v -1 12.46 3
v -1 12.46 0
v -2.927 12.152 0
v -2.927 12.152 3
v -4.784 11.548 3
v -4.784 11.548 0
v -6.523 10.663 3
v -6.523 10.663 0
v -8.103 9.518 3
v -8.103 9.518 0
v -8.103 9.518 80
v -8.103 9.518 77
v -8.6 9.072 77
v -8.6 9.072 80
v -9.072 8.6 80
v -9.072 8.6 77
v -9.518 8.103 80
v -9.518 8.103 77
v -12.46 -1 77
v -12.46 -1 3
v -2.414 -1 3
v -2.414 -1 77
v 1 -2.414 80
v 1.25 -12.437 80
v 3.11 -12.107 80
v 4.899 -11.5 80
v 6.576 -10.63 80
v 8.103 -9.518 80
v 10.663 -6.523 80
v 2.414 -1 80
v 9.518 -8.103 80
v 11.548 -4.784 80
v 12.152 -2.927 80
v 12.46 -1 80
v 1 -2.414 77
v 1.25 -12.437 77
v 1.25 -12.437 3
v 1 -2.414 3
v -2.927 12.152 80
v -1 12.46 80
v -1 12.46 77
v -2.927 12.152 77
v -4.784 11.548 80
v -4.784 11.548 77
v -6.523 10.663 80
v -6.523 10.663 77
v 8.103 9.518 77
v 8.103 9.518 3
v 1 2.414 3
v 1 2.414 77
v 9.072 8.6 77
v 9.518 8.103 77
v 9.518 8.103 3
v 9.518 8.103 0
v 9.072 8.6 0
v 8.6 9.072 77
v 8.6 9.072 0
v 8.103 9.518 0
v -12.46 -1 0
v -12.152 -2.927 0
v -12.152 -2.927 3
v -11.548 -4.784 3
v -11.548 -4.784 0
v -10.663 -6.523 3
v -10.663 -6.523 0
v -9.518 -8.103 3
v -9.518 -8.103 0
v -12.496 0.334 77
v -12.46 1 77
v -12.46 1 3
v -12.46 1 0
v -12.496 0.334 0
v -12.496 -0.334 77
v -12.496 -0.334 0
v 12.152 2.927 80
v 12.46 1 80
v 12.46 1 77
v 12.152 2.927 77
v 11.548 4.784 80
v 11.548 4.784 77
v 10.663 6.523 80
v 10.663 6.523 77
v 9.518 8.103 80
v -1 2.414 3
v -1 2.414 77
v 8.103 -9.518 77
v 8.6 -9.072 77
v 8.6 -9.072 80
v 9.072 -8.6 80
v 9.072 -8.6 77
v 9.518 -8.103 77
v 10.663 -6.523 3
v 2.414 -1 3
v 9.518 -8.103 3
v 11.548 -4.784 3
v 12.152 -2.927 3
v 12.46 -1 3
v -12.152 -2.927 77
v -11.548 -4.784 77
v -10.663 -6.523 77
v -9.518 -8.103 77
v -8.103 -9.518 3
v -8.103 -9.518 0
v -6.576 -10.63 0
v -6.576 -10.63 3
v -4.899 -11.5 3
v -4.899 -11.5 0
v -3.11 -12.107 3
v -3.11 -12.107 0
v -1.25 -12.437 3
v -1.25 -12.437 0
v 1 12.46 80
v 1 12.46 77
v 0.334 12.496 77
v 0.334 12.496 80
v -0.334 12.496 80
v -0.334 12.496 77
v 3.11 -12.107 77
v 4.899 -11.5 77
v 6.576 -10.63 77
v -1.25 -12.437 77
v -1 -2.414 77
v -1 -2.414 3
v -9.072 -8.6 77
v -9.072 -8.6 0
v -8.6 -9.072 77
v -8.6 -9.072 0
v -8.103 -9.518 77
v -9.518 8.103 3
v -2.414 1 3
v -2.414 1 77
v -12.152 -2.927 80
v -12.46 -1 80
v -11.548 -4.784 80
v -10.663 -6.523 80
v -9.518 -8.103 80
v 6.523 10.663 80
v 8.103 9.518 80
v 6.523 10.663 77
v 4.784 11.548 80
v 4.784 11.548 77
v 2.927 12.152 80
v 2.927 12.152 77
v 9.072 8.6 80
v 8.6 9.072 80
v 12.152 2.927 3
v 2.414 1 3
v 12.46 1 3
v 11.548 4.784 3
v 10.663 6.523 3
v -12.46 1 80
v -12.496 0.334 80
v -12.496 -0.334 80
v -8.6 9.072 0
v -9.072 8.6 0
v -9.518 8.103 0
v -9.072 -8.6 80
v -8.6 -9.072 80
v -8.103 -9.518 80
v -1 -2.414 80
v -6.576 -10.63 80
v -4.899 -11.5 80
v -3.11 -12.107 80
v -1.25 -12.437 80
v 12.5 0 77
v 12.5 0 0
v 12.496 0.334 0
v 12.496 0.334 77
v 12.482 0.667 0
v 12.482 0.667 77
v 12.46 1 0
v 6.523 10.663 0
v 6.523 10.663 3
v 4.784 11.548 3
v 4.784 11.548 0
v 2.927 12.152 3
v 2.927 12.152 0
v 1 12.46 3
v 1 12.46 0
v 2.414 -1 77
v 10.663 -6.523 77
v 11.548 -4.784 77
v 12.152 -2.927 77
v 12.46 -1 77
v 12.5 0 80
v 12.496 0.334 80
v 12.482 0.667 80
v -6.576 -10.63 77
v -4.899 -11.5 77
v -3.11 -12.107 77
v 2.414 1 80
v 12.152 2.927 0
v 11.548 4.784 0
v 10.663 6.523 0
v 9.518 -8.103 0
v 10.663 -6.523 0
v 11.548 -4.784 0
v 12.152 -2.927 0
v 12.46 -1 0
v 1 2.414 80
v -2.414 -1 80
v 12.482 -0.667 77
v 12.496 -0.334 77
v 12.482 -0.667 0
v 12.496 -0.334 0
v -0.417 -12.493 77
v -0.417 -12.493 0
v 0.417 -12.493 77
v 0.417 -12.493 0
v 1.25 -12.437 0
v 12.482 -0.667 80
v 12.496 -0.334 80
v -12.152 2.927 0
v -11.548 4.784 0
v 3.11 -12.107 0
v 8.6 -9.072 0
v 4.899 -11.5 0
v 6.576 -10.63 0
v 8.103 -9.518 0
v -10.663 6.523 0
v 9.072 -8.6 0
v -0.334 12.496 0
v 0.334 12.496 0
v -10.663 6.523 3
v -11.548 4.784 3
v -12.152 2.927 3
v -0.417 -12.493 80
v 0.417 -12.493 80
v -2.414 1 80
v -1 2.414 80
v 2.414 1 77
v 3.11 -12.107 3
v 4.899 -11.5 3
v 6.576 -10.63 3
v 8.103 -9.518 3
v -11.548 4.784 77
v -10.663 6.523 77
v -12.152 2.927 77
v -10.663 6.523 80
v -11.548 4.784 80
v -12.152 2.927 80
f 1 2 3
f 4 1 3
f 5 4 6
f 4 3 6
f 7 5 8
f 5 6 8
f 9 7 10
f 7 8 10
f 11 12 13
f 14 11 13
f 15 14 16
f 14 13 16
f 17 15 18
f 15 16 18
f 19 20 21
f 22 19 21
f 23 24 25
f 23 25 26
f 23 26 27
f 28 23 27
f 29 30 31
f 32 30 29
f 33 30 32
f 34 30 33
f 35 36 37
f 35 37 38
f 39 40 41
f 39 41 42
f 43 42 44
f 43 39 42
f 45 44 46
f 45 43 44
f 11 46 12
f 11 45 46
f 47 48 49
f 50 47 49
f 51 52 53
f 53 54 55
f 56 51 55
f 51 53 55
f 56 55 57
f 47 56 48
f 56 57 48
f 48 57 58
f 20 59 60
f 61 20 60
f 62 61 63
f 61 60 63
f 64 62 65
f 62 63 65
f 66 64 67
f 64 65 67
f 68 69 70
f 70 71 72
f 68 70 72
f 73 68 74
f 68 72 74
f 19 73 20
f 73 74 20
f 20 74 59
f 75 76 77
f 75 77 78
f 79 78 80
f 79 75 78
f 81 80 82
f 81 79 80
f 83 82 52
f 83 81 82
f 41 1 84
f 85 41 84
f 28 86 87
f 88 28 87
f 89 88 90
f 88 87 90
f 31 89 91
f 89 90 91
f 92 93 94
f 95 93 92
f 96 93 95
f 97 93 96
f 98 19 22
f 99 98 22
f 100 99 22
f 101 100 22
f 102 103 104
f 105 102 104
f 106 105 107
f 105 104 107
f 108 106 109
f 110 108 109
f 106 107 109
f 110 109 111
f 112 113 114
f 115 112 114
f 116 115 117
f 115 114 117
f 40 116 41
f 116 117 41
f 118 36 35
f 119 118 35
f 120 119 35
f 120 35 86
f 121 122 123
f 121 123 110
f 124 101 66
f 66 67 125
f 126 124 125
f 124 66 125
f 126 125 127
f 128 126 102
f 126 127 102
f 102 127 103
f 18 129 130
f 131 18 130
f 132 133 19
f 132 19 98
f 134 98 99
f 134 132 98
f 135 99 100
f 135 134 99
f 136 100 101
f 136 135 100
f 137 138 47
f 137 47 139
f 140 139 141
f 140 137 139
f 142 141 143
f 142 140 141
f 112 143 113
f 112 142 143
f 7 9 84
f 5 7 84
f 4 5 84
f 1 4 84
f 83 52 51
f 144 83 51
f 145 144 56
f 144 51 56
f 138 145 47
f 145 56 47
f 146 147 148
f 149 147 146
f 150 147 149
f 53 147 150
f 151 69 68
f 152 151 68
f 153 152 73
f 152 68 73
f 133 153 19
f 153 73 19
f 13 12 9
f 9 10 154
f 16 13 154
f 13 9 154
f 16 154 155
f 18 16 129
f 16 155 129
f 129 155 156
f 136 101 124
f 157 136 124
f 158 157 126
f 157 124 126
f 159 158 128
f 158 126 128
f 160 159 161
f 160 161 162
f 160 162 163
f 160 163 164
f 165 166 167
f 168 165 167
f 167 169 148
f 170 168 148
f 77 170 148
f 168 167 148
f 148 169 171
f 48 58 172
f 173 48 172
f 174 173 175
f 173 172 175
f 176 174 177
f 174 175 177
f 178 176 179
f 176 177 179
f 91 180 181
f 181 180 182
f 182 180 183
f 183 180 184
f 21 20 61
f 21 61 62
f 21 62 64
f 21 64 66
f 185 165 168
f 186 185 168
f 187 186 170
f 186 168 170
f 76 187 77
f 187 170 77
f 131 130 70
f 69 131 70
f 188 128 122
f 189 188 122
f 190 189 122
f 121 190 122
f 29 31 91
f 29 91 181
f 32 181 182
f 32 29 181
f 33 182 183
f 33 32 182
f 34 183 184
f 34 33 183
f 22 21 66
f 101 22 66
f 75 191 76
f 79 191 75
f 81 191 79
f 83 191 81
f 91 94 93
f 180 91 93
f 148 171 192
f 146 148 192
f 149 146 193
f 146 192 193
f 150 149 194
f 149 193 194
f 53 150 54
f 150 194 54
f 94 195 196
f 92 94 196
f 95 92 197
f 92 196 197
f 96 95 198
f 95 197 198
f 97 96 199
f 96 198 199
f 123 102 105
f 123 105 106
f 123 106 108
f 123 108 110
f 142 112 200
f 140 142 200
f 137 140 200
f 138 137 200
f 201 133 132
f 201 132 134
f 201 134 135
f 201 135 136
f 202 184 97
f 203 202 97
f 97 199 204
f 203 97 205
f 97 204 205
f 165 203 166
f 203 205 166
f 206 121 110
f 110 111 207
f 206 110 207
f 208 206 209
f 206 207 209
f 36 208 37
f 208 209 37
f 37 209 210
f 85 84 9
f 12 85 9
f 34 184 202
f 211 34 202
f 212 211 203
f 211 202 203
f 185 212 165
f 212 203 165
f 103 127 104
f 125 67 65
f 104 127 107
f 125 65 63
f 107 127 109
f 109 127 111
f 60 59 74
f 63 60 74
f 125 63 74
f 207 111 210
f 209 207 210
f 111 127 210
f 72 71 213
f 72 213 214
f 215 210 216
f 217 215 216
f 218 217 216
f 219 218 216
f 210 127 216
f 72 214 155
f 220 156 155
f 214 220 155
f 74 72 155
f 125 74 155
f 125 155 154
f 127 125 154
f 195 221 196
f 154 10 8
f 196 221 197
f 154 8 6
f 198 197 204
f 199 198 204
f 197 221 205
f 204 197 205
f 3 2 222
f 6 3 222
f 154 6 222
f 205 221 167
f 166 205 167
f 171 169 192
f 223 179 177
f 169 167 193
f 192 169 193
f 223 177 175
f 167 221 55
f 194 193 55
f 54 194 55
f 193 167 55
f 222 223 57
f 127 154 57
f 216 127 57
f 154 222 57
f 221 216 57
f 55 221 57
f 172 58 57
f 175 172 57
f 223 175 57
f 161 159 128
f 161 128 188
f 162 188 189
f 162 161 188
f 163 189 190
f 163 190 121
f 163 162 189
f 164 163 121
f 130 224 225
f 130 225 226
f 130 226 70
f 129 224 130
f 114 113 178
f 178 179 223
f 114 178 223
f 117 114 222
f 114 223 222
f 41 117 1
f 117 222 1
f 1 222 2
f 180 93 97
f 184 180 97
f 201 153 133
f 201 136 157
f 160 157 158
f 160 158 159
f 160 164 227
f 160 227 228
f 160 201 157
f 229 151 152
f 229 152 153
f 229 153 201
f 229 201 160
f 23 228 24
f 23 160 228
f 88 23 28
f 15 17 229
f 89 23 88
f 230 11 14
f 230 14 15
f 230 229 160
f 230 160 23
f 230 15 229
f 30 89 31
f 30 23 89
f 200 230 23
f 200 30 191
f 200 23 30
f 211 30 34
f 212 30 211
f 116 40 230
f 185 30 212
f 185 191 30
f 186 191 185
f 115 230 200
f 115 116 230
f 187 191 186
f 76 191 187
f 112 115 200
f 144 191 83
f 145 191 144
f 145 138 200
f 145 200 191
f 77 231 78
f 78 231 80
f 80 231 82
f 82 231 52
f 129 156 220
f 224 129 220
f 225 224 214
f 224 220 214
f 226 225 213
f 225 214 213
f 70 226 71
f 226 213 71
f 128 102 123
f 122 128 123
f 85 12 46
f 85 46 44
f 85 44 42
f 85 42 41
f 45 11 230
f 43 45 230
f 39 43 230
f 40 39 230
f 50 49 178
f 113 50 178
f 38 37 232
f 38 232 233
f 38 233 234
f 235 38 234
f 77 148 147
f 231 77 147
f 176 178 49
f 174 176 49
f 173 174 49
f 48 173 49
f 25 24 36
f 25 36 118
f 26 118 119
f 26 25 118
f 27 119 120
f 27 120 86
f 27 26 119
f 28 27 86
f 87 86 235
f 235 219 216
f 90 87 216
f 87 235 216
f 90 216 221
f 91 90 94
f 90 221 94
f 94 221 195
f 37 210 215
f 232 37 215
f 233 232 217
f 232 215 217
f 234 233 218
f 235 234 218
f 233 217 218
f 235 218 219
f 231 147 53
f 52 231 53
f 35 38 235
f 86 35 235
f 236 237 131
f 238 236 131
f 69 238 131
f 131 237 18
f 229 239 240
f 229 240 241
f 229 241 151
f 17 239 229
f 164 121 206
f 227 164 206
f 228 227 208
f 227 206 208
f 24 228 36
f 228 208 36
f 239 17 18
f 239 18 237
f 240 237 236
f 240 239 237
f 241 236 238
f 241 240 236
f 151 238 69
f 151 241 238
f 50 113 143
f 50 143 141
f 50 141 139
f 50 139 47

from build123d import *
from build123d import SkipClean  # not in build123d's __all__

# Parameters (mm, degrees)
F1_DEPTH = 3
F2_DEPTH = 80
F4_DEPTH = 3


with BuildPart() as f1:
    # F0 (on Top) → F1 (new body)
    with BuildSketch(Plane.XY):
        with BuildLine():
            Line((1, 2.4142135624), (8.1033983122, 9.5176118745))
            ThreePointArc((8.1033983122, 9.5176118745), (4.7835429046, 11.5484941564), (1, 12.4599357944))
            Line((1, 12.4599357944), (1, 2.4142135624))
        make_face()
    extrude(amount=F1_DEPTH)



with BuildPart() as f1b:
    # F0 (on Top) → F1, piece 2 (new body)
    with BuildSketch(Plane.XY):
        with BuildLine():
            Line((-1, 2.4142135624), (-1, 12.4599357944))
            ThreePointArc((-1, 12.4599357944), (-4.7835429046, 11.5484941564), (-8.1033983122, 9.5176118745))
            Line((-8.1033983122, 9.5176118745), (-1, 2.4142135624))
        make_face()
    extrude(amount=F1_DEPTH)


with BuildPart() as f1c:
    # F0 (on Top) → F1, piece 3 (new body)
    with BuildSketch(Plane.XY):
        with BuildLine():
            Line((2.4142135624, 1), (12.4599357944, 1))
            ThreePointArc((12.4599357944, 1), (11.5484941564, 4.7835429046), (9.5176118745, 8.1033983122))
            Line((9.5176118745, 8.1033983122), (2.4142135624, 1))
        make_face()
    extrude(amount=F1_DEPTH)


with BuildPart() as f1d:
    # F0 (on Top) → F1, piece 4 (new body)
    with BuildSketch(Plane.XY):
        with BuildLine():
            ThreePointArc((9.5176118745, -8.1033983122), (11.5484941564, -4.7835429046), (12.4599357944, -1))
            Line((12.4599357944, -1), (2.4142135624, -1))
            Line((2.4142135624, -1), (9.5176118745, -8.1033983122))
        make_face()
    extrude(amount=F1_DEPTH)


with BuildPart() as f1e:
    # F0 (on Top) → F1, piece 5 (new body)
    with BuildSketch(Plane.XY):
        with BuildLine():
            Line((-12.4599357944, 1), (-2.4142135624, 1))
            Line((-2.4142135624, 1), (-9.5176118745, 8.1033983122))
            ThreePointArc((-9.5176118745, 8.1033983122), (-11.5484941564, 4.7835429046), (-12.4599357944, 1))
        make_face()
    extrude(amount=F1_DEPTH)


with BuildPart() as f1f:
    # F0 (on Top) → F1, piece 6 (new body)
    with BuildSketch(Plane.XY):
        with BuildLine():
            ThreePointArc((-12.4599357944, -1), (-11.5484941564, -4.7835429046), (-9.5176118745, -8.1033983122))
            Line((-9.5176118745, -8.1033983122), (-2.4142135624, -1))
            Line((-2.4142135624, -1), (-12.4599357944, -1))
        make_face()
    extrude(amount=F1_DEPTH)


with BuildPart() as f1g:
    # F0 (on Top) → F1, piece 7 (new body)
    with BuildSketch(Plane.XY):
        with BuildLine():
            ThreePointArc((-8.1033983122, -9.5176118745), (-4.899257332, -11.499881634), (-1.25, -12.4373429638))
            Line((-1.25, -12.4373429638), (-1, -2.4142135624))
            Line((-1, -2.4142135624), (-8.1033983122, -9.5176118745))
        make_face()
    extrude(amount=F1_DEPTH)


with BuildPart() as f1h:
    # F0 (on Top) → F1, piece 8 (new body)
    with BuildSketch(Plane.XY):
        with BuildLine():
            ThreePointArc((1.25, -12.4373429638), (4.899257332, -11.499881634), (8.1033983122, -9.5176118745))
            Line((8.1033983122, -9.5176118745), (1, -2.4142135624))
            Line((1, -2.4142135624), (1.25, -12.4373429638))
        make_face()
    extrude(amount=F1_DEPTH)


with BuildPart() as f1_1:
    add(f1.part, clean=False)

    add(f1b.part)  # F2 merges F1b

    add(f1c.part)  # F2 merges F1c

    add(f1d.part)  # F2 merges F1d

    add(f1e.part)  # F2 merges F1e

    add(f1f.part)  # F2 merges F1f

    add(f1g.part)  # F2 merges F1g

    add(f1h.part)  # F2 merges F1h
    # F0 (on Top) → F2 (join)
    with BuildSketch(Plane.XY):
        with BuildLine():
            Line((1, 2.4142135624), (1, 12.4599357944))
            ThreePointArc((1, 12.4599357944), (0, 12.5), (-1, 12.4599357944))
            Line((-1, 12.4599357944), (-1, 2.4142135624))
            Line((-1, 2.4142135624), (0, 1.4142135624))
            Line((0, 1.4142135624), (1, 2.4142135624))
        make_face()
        with BuildLine():
            Line((2.4142135624, 1), (9.5176118745, 8.1033983122))
            ThreePointArc((9.5176118745, 8.1033983122), (8.8388347648, 8.8388347648), (8.1033983122, 9.5176118745))
            Line((8.1033983122, 9.5176118745), (1, 2.4142135624))
            Line((1, 2.4142135624), (0, 1.4142135624))
            Line((0, 1.4142135624), (-1, 2.4142135624))
            Line((-1, 2.4142135624), (-8.1033983122, 9.5176118745))
            ThreePointArc((-8.1033983122, 9.5176118745), (-8.8388347648, 8.8388347648), (-9.5176118745, 8.1033983122))
            Line((-9.5176118745, 8.1033983122), (-2.4142135624, 1))
            Line((-2.4142135624, 1), (0, -1.4142135624))
            Line((0, -1.4142135624), (1, -2.4142135624))
            Line((1, -2.4142135624), (8.1033983122, -9.5176118745))
            ThreePointArc((8.1033983122, -9.5176118745), (8.8388347648, -8.8388347648), (9.5176118745, -8.1033983122))
            Line((9.5176118745, -8.1033983122), (2.4142135624, -1))
            Line((2.4142135624, -1), (1.4142135624, 0))
            Line((1.4142135624, 0), (2.4142135624, 1))
        make_face()
        with BuildLine():
            Line((-1, -2.4142135624), (0, -1.4142135624))
            Line((0, -1.4142135624), (-2.4142135624, 1))
            Line((-2.4142135624, 1), (-12.4599357944, 1))
            ThreePointArc((-12.4599357944, 1), (-12.5, 0), (-12.4599357944, -1))
            Line((-12.4599357944, -1), (-2.4142135624, -1))
            Line((-2.4142135624, -1), (-9.5176118745, -8.1033983122))
            ThreePointArc((-9.5176118745, -8.1033983122), (-8.8388347648, -8.8388347648), (-8.1033983122, -9.5176118745))
            Line((-8.1033983122, -9.5176118745), (-1, -2.4142135624))
        make_face()
        with BuildLine():
            ThreePointArc((12.4599357944, -1), (12.4899799325, -0.5004011242), (12.5, 0))
            ThreePointArc((12.5, 0), (12.4899799325, 0.5004011242), (12.4599357944, 1))
            Line((12.4599357944, 1), (2.4142135624, 1))
            Line((2.4142135624, 1), (1.4142135624, 0))
            Line((1.4142135624, 0), (2.4142135624, -1))
            Line((2.4142135624, -1), (12.4599357944, -1))
        make_face()
        with BuildLine():
            ThreePointArc((-1.25, -12.4373429638), (0, -12.5), (1.25, -12.4373429638))
            Line((1.25, -12.4373429638), (1, -2.4142135624))
            Line((1, -2.4142135624), (0, -1.4142135624))
            Line((0, -1.4142135624), (-1, -2.4142135624))
            Line((-1, -2.4142135624), (-1.25, -12.4373429638))
        make_face()
    extrude(amount=F2_DEPTH)

    # F3 (on face) → F4 (join)
    with BuildSketch(Plane.XY.offset(80)):
        with BuildLine():
            Line((1, 2.4142135624), (8.1033983122, 9.5176118745))
            ThreePointArc((8.1033983122, 9.5176118745), (4.7835429046, 11.5484941564), (1, 12.4599357944))
            Line((1, 12.4599357944), (1, 2.4142135624))
        make_face()
        with BuildLine():
            Line((-1, 2.4142135624), (-1, 12.4599357944))
            ThreePointArc((-1, 12.4599357944), (-4.7835429046, 11.5484941564), (-8.1033983122, 9.5176118745))
            Line((-8.1033983122, 9.5176118745), (-1, 2.4142135624))
        make_face()
        with BuildLine():
            ThreePointArc((12.4599357944, -1), (12.4899799325, -0.5004011242), (12.5, 0))
            ThreePointArc((12.5, 0), (12.4899799325, 0.5004011242), (12.4599357944, 1))
            Line((12.4599357944, 1), (2.4142135624, 1))
            Line((2.4142135624, 1), (9.5176118745, 8.1033983122))
            ThreePointArc((9.5176118745, 8.1033983122), (8.8388347648, 8.8388347648), (8.1033983122, 9.5176118745))
            Line((8.1033983122, 9.5176118745), (1, 2.4142135624))
            Line((1, 2.4142135624), (1, 12.4599357944))
            ThreePointArc((1, 12.4599357944), (0, 12.5), (-1, 12.4599357944))
            Line((-1, 12.4599357944), (-1, 2.4142135624))
            Line((-1, 2.4142135624), (-8.1033983122, 9.5176118745))
            ThreePointArc((-8.1033983122, 9.5176118745), (-8.8388347648, 8.8388347648), (-9.5176118745, 8.1033983122))
            Line((-9.5176118745, 8.1033983122), (-2.4142135624, 1))
            Line((-2.4142135624, 1), (-12.4599357944, 1))
            ThreePointArc((-12.4599357944, 1), (-12.5, 0), (-12.4599357944, -1))
            Line((-12.4599357944, -1), (-2.4142135624, -1))
            Line((-2.4142135624, -1), (-9.5176118745, -8.1033983122))
            ThreePointArc((-9.5176118745, -8.1033983122), (-8.8388347648, -8.8388347648), (-8.1033983122, -9.5176118745))
            Line((-8.1033983122, -9.5176118745), (-1, -2.4142135624))
            Line((-1, -2.4142135624), (-1.25, -12.4373429638))
            ThreePointArc((-1.25, -12.4373429638), (0, -12.5), (1.25, -12.4373429638))
            Line((1.25, -12.4373429638), (1, -2.4142135624))
            Line((1, -2.4142135624), (8.1033983122, -9.5176118745))
            ThreePointArc((8.1033983122, -9.5176118745), (8.8388347648, -8.8388347648), (9.5176118745, -8.1033983122))
            Line((9.5176118745, -8.1033983122), (2.4142135624, -1))
            Line((2.4142135624, -1), (12.4599357944, -1))
        make_face()
        with BuildLine():
            Line((-2.4142135624, 1), (-9.5176118745, 8.1033983122))
            ThreePointArc((-9.5176118745, 8.1033983122), (-11.5484941564, 4.7835429046), (-12.4599357944, 1))
            Line((-12.4599357944, 1), (-2.4142135624, 1))
        make_face()
        with BuildLine():
            ThreePointArc((-12.4599357944, -1), (-11.5484941564, -4.7835429046), (-9.5176118745, -8.1033983122))
            Line((-9.5176118745, -8.1033983122), (-2.4142135624, -1))
            Line((-2.4142135624, -1), (-12.4599357944, -1))
        make_face()
        with BuildLine():
            ThreePointArc((-8.1033983122, -9.5176118745), (-4.899257332, -11.499881634), (-1.25, -12.4373429638))
            Line((-1.25, -12.4373429638), (-1, -2.4142135624))
            Line((-1, -2.4142135624), (-8.1033983122, -9.5176118745))
        make_face()
        with BuildLine():
            ThreePointArc((1.25, -12.4373429638), (4.899257332, -11.499881634), (8.1033983122, -9.5176118745))
            Line((8.1033983122, -9.5176118745), (1, -2.4142135624))
            Line((1, -2.4142135624), (1.25, -12.4373429638))
        make_face()
        with BuildLine():
            ThreePointArc((9.5176118745, -8.1033983122), (11.5484941564, -4.7835429046), (12.4599357944, -1))
            Line((12.4599357944, -1), (2.4142135624, -1))
            Line((2.4142135624, -1), (9.5176118745, -8.1033983122))
        make_face()
        with BuildLine():
            Line((2.4142135624, 1), (12.4599357944, 1))
            ThreePointArc((12.4599357944, 1), (11.5484941564, 4.7835429046), (9.5176118745, 8.1033983122))
            Line((9.5176118745, 8.1033983122), (2.4142135624, 1))
        make_face()
    with SkipClean():  # cleaning this boolean's faces spoils the solid; the shape is the same uncleaned
        extrude(amount=-F4_DEPTH)


solid = f1_1.part
